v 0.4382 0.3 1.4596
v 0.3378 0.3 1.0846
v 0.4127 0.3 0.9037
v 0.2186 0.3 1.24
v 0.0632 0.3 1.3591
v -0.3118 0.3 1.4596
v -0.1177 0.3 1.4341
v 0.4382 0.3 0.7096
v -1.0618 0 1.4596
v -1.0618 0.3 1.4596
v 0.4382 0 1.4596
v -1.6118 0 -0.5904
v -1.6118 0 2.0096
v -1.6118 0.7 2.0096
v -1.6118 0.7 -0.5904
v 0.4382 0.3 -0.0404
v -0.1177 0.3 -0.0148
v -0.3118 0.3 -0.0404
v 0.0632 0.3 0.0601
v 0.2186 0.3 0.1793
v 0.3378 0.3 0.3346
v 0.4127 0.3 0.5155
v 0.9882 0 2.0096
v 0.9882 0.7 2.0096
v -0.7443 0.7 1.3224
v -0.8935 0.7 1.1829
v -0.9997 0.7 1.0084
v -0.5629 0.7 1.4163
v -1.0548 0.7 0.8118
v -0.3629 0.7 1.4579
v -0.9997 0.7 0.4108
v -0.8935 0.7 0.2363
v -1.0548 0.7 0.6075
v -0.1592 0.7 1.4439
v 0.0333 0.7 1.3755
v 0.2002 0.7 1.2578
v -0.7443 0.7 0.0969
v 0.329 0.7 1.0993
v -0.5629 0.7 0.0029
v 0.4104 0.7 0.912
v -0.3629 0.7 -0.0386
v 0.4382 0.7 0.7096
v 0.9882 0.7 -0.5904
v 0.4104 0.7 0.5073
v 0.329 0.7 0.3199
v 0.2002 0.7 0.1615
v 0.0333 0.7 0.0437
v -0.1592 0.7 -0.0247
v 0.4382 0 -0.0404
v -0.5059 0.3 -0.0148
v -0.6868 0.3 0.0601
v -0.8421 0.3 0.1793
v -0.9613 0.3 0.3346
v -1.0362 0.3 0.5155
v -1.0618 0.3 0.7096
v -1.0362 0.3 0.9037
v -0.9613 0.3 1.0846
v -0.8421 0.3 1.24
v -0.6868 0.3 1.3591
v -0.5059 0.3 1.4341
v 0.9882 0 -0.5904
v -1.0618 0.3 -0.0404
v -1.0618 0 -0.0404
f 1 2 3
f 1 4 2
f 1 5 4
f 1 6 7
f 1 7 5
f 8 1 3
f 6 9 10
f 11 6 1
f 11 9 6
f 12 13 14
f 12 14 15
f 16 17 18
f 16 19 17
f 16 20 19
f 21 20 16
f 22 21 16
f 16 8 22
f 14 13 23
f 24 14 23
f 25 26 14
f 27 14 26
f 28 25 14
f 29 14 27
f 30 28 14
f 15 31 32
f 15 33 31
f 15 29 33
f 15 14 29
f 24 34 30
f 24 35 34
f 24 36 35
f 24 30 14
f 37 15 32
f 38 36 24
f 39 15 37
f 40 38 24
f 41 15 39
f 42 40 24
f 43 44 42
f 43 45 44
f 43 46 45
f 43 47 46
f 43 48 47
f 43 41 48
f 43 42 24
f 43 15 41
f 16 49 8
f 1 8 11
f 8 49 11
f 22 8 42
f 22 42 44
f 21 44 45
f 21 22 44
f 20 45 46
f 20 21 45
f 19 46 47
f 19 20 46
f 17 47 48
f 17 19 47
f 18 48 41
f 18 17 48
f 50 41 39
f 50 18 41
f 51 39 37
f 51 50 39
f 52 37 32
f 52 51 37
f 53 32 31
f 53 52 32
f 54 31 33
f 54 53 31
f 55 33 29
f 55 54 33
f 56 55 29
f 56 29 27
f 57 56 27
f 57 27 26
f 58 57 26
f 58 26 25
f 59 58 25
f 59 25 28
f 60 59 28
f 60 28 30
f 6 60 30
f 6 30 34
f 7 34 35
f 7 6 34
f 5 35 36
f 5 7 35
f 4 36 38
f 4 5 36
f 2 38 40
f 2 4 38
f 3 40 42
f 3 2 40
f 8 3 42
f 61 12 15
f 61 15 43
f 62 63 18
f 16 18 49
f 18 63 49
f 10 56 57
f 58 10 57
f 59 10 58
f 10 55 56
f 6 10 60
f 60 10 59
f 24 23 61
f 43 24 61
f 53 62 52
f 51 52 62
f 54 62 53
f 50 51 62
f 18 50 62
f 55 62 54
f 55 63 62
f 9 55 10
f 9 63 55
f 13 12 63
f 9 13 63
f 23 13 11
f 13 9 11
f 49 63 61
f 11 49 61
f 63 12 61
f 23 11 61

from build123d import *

# Parameters (mm, degrees)
SKETCH1_W           = 2.6
SKETCH1_H           = 2.6
SKETCH1_R           = 0.75
BOSS_EXTRUDE1_DEPTH = 0.7
SKETCH2_W           = 1.5
SKETCH2_H           = 1.5
CUT_EXTRUDE1_DEPTH  = 0.3


with BuildPart() as part:
    # Sketch1 → Boss-Extrude1 (new body)
    with BuildSketch(Plane(origin=(0, 0, 0), x_dir=(1, 0, 0), z_dir=(0, 1, 0))):
        with Locations((-0.311764706, -0.709625668)):
            Rectangle(SKETCH1_W, SKETCH1_H)
        with Locations((-0.311764706, -0.709625668)):
            Circle(SKETCH1_R, mode=Mode.SUBTRACT)
    extrude(amount=BOSS_EXTRUDE1_DEPTH)

    # Sketch2 → Cut-Extrude1 (cut)
    with BuildSketch(Plane.XZ):
        with Locations((-0.311764706, 0.709625668)):
            Rectangle(SKETCH2_W, SKETCH2_H)
    extrude(amount=-CUT_EXTRUDE1_DEPTH, mode=Mode.SUBTRACT)


solid = part.part
